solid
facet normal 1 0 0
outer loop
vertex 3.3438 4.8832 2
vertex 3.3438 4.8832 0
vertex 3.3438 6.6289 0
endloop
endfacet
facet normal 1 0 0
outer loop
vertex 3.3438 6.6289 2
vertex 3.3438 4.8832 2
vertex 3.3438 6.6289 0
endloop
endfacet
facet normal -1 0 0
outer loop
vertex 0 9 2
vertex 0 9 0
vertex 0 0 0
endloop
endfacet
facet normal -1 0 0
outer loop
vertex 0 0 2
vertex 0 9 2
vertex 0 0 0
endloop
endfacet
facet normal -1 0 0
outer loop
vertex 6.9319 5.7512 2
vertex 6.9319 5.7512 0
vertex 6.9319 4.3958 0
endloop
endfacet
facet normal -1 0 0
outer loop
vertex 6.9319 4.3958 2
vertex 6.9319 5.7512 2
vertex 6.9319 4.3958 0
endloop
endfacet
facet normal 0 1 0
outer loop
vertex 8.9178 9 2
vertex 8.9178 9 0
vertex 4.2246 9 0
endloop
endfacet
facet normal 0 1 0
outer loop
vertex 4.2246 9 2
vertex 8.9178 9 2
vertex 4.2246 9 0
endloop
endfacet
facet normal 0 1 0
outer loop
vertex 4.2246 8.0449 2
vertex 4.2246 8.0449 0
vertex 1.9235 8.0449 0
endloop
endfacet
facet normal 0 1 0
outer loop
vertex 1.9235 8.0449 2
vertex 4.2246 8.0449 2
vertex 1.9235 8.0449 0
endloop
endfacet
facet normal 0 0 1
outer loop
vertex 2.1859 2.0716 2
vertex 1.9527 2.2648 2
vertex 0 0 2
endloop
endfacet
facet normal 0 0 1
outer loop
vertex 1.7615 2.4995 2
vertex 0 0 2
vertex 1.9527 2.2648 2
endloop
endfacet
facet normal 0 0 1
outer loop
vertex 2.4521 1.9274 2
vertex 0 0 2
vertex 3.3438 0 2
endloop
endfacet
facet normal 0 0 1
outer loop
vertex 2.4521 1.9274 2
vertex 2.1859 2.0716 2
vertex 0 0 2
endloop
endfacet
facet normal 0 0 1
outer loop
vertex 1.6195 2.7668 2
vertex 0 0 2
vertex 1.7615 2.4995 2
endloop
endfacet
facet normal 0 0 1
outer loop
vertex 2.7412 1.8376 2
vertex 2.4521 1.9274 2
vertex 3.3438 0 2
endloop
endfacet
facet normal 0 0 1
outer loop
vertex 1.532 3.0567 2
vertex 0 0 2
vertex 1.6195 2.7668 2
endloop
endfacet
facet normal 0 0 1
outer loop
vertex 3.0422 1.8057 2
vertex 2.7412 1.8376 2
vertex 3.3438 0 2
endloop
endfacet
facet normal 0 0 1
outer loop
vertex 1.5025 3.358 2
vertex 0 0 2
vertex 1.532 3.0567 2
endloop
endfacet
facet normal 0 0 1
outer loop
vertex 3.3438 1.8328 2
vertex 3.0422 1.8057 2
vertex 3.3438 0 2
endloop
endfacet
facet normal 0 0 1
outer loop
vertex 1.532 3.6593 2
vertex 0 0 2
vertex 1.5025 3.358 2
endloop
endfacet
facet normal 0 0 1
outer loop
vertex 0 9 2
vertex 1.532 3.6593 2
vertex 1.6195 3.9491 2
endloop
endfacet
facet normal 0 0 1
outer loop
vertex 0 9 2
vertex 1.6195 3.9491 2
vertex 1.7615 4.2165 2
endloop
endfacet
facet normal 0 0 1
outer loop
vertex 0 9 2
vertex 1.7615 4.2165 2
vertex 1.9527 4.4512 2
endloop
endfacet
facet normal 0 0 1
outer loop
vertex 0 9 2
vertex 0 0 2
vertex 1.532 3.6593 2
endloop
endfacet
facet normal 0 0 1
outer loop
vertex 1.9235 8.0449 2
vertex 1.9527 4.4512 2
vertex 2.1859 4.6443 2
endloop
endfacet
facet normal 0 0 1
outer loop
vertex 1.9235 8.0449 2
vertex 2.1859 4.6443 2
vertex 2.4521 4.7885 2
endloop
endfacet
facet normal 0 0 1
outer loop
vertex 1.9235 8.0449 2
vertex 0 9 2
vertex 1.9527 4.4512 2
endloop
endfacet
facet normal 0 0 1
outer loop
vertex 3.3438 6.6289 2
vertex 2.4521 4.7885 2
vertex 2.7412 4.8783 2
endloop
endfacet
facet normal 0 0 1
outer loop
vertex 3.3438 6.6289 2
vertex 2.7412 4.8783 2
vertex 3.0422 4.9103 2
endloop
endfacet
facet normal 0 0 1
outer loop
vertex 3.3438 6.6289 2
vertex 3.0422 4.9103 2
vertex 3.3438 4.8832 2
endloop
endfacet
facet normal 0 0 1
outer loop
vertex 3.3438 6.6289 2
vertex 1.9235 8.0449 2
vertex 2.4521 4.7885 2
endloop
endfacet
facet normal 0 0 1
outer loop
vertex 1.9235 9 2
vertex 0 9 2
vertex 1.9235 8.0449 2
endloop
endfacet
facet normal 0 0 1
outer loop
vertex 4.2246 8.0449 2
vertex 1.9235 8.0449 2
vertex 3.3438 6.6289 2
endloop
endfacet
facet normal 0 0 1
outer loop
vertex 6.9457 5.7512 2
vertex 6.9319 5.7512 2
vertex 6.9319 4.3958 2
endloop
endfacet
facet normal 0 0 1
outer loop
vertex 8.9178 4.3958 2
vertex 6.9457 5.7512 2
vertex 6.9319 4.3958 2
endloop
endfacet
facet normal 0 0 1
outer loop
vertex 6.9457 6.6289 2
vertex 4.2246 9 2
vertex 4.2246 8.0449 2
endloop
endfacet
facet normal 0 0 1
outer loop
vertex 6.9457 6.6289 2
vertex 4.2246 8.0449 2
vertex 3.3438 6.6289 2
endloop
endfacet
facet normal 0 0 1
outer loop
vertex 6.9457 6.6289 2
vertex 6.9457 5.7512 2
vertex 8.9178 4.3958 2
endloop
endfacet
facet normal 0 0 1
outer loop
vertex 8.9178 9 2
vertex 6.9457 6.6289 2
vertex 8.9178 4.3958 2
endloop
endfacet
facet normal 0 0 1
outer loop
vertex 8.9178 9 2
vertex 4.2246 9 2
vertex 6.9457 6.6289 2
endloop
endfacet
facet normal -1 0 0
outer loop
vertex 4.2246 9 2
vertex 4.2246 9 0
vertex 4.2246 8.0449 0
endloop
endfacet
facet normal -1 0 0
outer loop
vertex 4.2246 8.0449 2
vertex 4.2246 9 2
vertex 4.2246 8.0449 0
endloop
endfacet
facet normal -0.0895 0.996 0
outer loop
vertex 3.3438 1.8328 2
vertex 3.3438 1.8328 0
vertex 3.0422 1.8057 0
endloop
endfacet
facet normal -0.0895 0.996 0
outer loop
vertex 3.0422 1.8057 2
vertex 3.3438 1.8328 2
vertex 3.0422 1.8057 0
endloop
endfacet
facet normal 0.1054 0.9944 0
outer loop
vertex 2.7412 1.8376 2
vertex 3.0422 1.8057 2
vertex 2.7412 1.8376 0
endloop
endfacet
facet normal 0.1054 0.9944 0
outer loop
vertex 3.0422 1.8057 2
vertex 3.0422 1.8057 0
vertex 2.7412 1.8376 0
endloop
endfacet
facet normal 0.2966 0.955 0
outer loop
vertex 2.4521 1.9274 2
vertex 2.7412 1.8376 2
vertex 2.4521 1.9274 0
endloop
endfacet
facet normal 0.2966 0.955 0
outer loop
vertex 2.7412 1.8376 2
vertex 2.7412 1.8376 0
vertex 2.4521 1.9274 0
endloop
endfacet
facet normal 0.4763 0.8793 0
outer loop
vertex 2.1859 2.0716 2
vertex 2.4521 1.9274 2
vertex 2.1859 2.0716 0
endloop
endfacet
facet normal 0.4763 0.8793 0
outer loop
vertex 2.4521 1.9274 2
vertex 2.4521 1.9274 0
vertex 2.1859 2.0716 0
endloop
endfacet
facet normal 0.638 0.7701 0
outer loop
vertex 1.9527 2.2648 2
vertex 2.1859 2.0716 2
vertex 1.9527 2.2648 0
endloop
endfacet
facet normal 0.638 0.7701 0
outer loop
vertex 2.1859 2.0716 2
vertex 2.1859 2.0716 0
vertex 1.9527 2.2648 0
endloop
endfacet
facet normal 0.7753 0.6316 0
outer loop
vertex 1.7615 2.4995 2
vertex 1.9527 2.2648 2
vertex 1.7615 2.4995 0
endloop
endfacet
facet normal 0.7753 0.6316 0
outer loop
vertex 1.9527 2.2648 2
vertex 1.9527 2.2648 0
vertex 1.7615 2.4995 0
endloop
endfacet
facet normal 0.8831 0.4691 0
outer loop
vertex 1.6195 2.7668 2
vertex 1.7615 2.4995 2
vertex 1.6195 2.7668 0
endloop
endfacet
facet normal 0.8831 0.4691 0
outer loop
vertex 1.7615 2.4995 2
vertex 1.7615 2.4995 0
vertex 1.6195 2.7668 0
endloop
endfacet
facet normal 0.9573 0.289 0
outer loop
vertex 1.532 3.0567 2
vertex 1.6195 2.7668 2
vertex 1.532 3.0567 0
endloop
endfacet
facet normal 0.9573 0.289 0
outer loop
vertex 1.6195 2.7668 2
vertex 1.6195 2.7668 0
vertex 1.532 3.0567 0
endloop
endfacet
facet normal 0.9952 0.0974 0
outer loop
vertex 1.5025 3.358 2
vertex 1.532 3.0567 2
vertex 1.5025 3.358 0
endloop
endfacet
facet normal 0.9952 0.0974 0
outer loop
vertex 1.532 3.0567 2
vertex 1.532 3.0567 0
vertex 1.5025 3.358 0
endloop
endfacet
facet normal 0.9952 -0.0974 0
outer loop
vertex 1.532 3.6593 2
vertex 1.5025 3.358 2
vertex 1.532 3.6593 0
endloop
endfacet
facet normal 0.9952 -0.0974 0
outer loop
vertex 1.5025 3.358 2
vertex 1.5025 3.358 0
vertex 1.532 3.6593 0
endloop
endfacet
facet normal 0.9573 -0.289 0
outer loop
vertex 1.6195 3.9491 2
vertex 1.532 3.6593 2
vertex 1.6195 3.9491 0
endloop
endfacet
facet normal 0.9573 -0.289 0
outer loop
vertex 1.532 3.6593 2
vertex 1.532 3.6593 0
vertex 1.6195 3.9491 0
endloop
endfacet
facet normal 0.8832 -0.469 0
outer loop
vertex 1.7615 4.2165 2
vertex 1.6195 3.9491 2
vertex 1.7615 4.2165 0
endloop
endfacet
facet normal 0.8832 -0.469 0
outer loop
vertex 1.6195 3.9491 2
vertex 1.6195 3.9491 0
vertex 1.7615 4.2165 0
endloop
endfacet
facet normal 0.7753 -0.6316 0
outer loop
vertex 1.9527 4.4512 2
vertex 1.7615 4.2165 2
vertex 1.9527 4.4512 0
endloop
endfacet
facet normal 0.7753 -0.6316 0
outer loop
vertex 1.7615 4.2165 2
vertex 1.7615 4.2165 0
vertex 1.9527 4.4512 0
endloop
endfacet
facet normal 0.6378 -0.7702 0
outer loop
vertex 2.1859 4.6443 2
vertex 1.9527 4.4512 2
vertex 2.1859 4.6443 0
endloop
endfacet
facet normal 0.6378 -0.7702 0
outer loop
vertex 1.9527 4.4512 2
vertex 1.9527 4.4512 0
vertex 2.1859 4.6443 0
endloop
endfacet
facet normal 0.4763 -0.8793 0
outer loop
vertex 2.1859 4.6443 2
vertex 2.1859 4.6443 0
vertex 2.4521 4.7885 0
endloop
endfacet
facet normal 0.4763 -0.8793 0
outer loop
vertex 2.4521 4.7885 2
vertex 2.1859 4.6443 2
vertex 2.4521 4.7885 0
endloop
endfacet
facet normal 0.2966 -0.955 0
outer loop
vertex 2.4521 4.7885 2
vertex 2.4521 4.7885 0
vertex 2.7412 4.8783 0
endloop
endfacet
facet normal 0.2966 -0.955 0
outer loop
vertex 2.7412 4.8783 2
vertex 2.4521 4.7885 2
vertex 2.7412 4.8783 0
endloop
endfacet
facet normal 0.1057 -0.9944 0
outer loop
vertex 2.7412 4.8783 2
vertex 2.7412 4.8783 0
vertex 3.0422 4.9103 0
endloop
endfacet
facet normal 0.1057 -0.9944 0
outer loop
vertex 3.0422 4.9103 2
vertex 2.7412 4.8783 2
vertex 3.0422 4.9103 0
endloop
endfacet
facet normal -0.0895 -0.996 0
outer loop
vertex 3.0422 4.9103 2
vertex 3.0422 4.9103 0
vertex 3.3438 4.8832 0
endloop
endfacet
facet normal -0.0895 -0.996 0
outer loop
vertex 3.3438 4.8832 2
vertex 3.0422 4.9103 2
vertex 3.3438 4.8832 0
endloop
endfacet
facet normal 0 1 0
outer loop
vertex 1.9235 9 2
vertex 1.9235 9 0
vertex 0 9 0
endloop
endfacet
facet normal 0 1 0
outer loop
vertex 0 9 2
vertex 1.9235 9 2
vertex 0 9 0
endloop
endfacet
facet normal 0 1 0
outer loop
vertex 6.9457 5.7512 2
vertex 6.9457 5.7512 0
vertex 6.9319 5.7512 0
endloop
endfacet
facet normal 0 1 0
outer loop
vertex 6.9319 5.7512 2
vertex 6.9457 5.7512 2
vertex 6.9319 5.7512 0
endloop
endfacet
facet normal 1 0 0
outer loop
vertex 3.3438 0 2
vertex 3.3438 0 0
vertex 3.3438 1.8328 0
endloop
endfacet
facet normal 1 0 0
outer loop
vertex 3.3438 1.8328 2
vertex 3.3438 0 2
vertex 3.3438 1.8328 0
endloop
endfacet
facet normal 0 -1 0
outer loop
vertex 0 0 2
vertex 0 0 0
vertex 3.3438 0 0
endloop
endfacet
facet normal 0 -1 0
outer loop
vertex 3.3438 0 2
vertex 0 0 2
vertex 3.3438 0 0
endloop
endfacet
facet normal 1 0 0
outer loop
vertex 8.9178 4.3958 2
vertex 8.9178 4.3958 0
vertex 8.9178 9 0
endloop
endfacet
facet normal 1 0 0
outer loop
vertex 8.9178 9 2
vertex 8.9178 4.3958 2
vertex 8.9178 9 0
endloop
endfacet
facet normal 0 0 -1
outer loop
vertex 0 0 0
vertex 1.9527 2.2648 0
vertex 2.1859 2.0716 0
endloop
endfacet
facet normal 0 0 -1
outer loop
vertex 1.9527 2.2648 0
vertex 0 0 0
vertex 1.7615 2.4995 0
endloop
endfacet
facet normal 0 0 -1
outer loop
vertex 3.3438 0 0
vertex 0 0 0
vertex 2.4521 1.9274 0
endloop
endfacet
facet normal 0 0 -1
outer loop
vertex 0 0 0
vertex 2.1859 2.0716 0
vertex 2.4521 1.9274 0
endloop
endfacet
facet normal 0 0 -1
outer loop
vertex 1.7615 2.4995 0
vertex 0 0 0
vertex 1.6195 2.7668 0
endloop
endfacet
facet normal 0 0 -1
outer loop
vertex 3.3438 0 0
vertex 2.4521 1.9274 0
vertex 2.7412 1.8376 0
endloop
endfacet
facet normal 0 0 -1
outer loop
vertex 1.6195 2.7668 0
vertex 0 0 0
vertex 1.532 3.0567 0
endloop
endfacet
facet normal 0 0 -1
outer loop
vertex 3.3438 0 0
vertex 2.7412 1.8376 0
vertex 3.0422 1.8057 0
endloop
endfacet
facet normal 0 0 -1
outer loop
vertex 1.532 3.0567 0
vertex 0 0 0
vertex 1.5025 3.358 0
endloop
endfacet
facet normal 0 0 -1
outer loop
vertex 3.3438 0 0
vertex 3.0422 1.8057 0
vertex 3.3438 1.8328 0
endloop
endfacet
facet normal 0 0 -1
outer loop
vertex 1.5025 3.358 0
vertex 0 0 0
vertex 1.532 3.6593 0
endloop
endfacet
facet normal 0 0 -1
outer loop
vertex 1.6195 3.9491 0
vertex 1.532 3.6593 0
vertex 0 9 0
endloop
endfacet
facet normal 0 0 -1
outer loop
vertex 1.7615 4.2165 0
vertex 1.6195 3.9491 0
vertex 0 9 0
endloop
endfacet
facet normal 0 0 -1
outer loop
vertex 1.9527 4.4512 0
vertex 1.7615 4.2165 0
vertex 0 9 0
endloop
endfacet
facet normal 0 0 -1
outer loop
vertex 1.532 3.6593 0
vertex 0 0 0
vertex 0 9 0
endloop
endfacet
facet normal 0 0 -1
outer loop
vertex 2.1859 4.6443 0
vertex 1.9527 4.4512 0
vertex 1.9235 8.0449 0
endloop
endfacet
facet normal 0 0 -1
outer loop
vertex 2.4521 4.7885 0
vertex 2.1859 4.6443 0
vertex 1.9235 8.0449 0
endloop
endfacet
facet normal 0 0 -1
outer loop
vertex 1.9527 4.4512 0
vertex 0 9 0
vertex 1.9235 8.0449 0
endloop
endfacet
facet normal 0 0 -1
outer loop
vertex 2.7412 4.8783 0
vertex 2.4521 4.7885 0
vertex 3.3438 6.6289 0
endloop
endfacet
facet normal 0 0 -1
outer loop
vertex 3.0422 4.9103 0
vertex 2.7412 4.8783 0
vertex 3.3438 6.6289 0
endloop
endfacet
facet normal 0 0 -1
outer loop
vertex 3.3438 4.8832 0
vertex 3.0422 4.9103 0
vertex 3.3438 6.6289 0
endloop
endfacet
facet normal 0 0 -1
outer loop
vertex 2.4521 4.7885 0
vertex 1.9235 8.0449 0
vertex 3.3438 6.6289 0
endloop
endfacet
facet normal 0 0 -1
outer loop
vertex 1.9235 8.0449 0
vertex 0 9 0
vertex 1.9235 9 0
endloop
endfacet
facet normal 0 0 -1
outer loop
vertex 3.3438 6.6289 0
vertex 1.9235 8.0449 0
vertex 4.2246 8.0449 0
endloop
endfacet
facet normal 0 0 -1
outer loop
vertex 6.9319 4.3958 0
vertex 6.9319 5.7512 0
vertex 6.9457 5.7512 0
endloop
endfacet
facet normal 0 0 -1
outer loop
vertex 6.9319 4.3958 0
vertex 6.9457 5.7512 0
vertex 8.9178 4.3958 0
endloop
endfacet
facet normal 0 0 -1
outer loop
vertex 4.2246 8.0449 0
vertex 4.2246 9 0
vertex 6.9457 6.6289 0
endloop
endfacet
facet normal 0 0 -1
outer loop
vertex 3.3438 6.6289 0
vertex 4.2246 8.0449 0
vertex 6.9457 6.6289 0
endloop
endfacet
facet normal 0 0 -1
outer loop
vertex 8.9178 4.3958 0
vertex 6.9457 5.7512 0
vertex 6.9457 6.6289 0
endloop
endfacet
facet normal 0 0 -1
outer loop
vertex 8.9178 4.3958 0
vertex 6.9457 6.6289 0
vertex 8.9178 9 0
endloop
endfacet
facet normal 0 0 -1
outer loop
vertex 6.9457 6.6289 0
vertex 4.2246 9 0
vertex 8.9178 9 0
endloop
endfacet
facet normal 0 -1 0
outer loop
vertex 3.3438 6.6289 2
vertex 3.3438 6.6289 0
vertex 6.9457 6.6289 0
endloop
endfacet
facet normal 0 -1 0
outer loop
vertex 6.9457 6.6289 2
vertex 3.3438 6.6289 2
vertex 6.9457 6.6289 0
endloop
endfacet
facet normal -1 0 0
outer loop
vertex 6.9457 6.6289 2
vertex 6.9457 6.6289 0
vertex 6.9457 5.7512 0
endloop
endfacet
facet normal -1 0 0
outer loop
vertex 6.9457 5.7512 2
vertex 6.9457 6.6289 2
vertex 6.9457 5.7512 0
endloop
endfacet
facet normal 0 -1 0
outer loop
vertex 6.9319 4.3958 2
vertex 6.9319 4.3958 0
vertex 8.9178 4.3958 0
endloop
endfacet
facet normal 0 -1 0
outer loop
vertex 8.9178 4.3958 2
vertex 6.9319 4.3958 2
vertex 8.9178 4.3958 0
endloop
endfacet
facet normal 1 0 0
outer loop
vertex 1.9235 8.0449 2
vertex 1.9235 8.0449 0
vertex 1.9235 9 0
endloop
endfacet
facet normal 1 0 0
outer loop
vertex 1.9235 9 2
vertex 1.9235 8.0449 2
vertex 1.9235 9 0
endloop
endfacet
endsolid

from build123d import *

# Parameters (mm, degrees)
F1_DEPTH = 2


with BuildPart() as f1:
    # F0 (on Top) → F1 (new body)
    with BuildSketch(Plane.XY):
        with BuildLine():
            Line((0, 9), (0, 0))
            Line((0, 0), (3.343781, 0))
            Line((3.343781, 0), (3.343781, 1.832761))
            ThreePointArc((3.343781, 1.832761), (1.502494, 3.357977), (3.343781, 4.883193))
            Line((3.343781, 4.883193), (3.343781, 6.628936))
            Line((3.343781, 6.628936), (6.945667, 6.628936))
            Line((6.945667, 6.628936), (6.945667, 5.751214))
            Line((6.945667, 5.751214), (6.931864, 5.751214))
            Line((6.931864, 5.751214), (6.931864, 4.395805))
            Line((6.931864, 4.395805), (8.91781, 4.395805))
            Line((8.91781, 4.395805), (8.91781, 9))
            Line((8.91781, 9), (4.224609, 9))
            Line((4.224609, 9), (4.224609, 8.044908))
            Line((4.224609, 8.044908), (1.923485, 8.044908))
            Line((1.923485, 8.044908), (1.923485, 9))
            Line((1.923485, 9), (0, 9))
        make_face()
    extrude(amount=F1_DEPTH)


solid = f1.part
